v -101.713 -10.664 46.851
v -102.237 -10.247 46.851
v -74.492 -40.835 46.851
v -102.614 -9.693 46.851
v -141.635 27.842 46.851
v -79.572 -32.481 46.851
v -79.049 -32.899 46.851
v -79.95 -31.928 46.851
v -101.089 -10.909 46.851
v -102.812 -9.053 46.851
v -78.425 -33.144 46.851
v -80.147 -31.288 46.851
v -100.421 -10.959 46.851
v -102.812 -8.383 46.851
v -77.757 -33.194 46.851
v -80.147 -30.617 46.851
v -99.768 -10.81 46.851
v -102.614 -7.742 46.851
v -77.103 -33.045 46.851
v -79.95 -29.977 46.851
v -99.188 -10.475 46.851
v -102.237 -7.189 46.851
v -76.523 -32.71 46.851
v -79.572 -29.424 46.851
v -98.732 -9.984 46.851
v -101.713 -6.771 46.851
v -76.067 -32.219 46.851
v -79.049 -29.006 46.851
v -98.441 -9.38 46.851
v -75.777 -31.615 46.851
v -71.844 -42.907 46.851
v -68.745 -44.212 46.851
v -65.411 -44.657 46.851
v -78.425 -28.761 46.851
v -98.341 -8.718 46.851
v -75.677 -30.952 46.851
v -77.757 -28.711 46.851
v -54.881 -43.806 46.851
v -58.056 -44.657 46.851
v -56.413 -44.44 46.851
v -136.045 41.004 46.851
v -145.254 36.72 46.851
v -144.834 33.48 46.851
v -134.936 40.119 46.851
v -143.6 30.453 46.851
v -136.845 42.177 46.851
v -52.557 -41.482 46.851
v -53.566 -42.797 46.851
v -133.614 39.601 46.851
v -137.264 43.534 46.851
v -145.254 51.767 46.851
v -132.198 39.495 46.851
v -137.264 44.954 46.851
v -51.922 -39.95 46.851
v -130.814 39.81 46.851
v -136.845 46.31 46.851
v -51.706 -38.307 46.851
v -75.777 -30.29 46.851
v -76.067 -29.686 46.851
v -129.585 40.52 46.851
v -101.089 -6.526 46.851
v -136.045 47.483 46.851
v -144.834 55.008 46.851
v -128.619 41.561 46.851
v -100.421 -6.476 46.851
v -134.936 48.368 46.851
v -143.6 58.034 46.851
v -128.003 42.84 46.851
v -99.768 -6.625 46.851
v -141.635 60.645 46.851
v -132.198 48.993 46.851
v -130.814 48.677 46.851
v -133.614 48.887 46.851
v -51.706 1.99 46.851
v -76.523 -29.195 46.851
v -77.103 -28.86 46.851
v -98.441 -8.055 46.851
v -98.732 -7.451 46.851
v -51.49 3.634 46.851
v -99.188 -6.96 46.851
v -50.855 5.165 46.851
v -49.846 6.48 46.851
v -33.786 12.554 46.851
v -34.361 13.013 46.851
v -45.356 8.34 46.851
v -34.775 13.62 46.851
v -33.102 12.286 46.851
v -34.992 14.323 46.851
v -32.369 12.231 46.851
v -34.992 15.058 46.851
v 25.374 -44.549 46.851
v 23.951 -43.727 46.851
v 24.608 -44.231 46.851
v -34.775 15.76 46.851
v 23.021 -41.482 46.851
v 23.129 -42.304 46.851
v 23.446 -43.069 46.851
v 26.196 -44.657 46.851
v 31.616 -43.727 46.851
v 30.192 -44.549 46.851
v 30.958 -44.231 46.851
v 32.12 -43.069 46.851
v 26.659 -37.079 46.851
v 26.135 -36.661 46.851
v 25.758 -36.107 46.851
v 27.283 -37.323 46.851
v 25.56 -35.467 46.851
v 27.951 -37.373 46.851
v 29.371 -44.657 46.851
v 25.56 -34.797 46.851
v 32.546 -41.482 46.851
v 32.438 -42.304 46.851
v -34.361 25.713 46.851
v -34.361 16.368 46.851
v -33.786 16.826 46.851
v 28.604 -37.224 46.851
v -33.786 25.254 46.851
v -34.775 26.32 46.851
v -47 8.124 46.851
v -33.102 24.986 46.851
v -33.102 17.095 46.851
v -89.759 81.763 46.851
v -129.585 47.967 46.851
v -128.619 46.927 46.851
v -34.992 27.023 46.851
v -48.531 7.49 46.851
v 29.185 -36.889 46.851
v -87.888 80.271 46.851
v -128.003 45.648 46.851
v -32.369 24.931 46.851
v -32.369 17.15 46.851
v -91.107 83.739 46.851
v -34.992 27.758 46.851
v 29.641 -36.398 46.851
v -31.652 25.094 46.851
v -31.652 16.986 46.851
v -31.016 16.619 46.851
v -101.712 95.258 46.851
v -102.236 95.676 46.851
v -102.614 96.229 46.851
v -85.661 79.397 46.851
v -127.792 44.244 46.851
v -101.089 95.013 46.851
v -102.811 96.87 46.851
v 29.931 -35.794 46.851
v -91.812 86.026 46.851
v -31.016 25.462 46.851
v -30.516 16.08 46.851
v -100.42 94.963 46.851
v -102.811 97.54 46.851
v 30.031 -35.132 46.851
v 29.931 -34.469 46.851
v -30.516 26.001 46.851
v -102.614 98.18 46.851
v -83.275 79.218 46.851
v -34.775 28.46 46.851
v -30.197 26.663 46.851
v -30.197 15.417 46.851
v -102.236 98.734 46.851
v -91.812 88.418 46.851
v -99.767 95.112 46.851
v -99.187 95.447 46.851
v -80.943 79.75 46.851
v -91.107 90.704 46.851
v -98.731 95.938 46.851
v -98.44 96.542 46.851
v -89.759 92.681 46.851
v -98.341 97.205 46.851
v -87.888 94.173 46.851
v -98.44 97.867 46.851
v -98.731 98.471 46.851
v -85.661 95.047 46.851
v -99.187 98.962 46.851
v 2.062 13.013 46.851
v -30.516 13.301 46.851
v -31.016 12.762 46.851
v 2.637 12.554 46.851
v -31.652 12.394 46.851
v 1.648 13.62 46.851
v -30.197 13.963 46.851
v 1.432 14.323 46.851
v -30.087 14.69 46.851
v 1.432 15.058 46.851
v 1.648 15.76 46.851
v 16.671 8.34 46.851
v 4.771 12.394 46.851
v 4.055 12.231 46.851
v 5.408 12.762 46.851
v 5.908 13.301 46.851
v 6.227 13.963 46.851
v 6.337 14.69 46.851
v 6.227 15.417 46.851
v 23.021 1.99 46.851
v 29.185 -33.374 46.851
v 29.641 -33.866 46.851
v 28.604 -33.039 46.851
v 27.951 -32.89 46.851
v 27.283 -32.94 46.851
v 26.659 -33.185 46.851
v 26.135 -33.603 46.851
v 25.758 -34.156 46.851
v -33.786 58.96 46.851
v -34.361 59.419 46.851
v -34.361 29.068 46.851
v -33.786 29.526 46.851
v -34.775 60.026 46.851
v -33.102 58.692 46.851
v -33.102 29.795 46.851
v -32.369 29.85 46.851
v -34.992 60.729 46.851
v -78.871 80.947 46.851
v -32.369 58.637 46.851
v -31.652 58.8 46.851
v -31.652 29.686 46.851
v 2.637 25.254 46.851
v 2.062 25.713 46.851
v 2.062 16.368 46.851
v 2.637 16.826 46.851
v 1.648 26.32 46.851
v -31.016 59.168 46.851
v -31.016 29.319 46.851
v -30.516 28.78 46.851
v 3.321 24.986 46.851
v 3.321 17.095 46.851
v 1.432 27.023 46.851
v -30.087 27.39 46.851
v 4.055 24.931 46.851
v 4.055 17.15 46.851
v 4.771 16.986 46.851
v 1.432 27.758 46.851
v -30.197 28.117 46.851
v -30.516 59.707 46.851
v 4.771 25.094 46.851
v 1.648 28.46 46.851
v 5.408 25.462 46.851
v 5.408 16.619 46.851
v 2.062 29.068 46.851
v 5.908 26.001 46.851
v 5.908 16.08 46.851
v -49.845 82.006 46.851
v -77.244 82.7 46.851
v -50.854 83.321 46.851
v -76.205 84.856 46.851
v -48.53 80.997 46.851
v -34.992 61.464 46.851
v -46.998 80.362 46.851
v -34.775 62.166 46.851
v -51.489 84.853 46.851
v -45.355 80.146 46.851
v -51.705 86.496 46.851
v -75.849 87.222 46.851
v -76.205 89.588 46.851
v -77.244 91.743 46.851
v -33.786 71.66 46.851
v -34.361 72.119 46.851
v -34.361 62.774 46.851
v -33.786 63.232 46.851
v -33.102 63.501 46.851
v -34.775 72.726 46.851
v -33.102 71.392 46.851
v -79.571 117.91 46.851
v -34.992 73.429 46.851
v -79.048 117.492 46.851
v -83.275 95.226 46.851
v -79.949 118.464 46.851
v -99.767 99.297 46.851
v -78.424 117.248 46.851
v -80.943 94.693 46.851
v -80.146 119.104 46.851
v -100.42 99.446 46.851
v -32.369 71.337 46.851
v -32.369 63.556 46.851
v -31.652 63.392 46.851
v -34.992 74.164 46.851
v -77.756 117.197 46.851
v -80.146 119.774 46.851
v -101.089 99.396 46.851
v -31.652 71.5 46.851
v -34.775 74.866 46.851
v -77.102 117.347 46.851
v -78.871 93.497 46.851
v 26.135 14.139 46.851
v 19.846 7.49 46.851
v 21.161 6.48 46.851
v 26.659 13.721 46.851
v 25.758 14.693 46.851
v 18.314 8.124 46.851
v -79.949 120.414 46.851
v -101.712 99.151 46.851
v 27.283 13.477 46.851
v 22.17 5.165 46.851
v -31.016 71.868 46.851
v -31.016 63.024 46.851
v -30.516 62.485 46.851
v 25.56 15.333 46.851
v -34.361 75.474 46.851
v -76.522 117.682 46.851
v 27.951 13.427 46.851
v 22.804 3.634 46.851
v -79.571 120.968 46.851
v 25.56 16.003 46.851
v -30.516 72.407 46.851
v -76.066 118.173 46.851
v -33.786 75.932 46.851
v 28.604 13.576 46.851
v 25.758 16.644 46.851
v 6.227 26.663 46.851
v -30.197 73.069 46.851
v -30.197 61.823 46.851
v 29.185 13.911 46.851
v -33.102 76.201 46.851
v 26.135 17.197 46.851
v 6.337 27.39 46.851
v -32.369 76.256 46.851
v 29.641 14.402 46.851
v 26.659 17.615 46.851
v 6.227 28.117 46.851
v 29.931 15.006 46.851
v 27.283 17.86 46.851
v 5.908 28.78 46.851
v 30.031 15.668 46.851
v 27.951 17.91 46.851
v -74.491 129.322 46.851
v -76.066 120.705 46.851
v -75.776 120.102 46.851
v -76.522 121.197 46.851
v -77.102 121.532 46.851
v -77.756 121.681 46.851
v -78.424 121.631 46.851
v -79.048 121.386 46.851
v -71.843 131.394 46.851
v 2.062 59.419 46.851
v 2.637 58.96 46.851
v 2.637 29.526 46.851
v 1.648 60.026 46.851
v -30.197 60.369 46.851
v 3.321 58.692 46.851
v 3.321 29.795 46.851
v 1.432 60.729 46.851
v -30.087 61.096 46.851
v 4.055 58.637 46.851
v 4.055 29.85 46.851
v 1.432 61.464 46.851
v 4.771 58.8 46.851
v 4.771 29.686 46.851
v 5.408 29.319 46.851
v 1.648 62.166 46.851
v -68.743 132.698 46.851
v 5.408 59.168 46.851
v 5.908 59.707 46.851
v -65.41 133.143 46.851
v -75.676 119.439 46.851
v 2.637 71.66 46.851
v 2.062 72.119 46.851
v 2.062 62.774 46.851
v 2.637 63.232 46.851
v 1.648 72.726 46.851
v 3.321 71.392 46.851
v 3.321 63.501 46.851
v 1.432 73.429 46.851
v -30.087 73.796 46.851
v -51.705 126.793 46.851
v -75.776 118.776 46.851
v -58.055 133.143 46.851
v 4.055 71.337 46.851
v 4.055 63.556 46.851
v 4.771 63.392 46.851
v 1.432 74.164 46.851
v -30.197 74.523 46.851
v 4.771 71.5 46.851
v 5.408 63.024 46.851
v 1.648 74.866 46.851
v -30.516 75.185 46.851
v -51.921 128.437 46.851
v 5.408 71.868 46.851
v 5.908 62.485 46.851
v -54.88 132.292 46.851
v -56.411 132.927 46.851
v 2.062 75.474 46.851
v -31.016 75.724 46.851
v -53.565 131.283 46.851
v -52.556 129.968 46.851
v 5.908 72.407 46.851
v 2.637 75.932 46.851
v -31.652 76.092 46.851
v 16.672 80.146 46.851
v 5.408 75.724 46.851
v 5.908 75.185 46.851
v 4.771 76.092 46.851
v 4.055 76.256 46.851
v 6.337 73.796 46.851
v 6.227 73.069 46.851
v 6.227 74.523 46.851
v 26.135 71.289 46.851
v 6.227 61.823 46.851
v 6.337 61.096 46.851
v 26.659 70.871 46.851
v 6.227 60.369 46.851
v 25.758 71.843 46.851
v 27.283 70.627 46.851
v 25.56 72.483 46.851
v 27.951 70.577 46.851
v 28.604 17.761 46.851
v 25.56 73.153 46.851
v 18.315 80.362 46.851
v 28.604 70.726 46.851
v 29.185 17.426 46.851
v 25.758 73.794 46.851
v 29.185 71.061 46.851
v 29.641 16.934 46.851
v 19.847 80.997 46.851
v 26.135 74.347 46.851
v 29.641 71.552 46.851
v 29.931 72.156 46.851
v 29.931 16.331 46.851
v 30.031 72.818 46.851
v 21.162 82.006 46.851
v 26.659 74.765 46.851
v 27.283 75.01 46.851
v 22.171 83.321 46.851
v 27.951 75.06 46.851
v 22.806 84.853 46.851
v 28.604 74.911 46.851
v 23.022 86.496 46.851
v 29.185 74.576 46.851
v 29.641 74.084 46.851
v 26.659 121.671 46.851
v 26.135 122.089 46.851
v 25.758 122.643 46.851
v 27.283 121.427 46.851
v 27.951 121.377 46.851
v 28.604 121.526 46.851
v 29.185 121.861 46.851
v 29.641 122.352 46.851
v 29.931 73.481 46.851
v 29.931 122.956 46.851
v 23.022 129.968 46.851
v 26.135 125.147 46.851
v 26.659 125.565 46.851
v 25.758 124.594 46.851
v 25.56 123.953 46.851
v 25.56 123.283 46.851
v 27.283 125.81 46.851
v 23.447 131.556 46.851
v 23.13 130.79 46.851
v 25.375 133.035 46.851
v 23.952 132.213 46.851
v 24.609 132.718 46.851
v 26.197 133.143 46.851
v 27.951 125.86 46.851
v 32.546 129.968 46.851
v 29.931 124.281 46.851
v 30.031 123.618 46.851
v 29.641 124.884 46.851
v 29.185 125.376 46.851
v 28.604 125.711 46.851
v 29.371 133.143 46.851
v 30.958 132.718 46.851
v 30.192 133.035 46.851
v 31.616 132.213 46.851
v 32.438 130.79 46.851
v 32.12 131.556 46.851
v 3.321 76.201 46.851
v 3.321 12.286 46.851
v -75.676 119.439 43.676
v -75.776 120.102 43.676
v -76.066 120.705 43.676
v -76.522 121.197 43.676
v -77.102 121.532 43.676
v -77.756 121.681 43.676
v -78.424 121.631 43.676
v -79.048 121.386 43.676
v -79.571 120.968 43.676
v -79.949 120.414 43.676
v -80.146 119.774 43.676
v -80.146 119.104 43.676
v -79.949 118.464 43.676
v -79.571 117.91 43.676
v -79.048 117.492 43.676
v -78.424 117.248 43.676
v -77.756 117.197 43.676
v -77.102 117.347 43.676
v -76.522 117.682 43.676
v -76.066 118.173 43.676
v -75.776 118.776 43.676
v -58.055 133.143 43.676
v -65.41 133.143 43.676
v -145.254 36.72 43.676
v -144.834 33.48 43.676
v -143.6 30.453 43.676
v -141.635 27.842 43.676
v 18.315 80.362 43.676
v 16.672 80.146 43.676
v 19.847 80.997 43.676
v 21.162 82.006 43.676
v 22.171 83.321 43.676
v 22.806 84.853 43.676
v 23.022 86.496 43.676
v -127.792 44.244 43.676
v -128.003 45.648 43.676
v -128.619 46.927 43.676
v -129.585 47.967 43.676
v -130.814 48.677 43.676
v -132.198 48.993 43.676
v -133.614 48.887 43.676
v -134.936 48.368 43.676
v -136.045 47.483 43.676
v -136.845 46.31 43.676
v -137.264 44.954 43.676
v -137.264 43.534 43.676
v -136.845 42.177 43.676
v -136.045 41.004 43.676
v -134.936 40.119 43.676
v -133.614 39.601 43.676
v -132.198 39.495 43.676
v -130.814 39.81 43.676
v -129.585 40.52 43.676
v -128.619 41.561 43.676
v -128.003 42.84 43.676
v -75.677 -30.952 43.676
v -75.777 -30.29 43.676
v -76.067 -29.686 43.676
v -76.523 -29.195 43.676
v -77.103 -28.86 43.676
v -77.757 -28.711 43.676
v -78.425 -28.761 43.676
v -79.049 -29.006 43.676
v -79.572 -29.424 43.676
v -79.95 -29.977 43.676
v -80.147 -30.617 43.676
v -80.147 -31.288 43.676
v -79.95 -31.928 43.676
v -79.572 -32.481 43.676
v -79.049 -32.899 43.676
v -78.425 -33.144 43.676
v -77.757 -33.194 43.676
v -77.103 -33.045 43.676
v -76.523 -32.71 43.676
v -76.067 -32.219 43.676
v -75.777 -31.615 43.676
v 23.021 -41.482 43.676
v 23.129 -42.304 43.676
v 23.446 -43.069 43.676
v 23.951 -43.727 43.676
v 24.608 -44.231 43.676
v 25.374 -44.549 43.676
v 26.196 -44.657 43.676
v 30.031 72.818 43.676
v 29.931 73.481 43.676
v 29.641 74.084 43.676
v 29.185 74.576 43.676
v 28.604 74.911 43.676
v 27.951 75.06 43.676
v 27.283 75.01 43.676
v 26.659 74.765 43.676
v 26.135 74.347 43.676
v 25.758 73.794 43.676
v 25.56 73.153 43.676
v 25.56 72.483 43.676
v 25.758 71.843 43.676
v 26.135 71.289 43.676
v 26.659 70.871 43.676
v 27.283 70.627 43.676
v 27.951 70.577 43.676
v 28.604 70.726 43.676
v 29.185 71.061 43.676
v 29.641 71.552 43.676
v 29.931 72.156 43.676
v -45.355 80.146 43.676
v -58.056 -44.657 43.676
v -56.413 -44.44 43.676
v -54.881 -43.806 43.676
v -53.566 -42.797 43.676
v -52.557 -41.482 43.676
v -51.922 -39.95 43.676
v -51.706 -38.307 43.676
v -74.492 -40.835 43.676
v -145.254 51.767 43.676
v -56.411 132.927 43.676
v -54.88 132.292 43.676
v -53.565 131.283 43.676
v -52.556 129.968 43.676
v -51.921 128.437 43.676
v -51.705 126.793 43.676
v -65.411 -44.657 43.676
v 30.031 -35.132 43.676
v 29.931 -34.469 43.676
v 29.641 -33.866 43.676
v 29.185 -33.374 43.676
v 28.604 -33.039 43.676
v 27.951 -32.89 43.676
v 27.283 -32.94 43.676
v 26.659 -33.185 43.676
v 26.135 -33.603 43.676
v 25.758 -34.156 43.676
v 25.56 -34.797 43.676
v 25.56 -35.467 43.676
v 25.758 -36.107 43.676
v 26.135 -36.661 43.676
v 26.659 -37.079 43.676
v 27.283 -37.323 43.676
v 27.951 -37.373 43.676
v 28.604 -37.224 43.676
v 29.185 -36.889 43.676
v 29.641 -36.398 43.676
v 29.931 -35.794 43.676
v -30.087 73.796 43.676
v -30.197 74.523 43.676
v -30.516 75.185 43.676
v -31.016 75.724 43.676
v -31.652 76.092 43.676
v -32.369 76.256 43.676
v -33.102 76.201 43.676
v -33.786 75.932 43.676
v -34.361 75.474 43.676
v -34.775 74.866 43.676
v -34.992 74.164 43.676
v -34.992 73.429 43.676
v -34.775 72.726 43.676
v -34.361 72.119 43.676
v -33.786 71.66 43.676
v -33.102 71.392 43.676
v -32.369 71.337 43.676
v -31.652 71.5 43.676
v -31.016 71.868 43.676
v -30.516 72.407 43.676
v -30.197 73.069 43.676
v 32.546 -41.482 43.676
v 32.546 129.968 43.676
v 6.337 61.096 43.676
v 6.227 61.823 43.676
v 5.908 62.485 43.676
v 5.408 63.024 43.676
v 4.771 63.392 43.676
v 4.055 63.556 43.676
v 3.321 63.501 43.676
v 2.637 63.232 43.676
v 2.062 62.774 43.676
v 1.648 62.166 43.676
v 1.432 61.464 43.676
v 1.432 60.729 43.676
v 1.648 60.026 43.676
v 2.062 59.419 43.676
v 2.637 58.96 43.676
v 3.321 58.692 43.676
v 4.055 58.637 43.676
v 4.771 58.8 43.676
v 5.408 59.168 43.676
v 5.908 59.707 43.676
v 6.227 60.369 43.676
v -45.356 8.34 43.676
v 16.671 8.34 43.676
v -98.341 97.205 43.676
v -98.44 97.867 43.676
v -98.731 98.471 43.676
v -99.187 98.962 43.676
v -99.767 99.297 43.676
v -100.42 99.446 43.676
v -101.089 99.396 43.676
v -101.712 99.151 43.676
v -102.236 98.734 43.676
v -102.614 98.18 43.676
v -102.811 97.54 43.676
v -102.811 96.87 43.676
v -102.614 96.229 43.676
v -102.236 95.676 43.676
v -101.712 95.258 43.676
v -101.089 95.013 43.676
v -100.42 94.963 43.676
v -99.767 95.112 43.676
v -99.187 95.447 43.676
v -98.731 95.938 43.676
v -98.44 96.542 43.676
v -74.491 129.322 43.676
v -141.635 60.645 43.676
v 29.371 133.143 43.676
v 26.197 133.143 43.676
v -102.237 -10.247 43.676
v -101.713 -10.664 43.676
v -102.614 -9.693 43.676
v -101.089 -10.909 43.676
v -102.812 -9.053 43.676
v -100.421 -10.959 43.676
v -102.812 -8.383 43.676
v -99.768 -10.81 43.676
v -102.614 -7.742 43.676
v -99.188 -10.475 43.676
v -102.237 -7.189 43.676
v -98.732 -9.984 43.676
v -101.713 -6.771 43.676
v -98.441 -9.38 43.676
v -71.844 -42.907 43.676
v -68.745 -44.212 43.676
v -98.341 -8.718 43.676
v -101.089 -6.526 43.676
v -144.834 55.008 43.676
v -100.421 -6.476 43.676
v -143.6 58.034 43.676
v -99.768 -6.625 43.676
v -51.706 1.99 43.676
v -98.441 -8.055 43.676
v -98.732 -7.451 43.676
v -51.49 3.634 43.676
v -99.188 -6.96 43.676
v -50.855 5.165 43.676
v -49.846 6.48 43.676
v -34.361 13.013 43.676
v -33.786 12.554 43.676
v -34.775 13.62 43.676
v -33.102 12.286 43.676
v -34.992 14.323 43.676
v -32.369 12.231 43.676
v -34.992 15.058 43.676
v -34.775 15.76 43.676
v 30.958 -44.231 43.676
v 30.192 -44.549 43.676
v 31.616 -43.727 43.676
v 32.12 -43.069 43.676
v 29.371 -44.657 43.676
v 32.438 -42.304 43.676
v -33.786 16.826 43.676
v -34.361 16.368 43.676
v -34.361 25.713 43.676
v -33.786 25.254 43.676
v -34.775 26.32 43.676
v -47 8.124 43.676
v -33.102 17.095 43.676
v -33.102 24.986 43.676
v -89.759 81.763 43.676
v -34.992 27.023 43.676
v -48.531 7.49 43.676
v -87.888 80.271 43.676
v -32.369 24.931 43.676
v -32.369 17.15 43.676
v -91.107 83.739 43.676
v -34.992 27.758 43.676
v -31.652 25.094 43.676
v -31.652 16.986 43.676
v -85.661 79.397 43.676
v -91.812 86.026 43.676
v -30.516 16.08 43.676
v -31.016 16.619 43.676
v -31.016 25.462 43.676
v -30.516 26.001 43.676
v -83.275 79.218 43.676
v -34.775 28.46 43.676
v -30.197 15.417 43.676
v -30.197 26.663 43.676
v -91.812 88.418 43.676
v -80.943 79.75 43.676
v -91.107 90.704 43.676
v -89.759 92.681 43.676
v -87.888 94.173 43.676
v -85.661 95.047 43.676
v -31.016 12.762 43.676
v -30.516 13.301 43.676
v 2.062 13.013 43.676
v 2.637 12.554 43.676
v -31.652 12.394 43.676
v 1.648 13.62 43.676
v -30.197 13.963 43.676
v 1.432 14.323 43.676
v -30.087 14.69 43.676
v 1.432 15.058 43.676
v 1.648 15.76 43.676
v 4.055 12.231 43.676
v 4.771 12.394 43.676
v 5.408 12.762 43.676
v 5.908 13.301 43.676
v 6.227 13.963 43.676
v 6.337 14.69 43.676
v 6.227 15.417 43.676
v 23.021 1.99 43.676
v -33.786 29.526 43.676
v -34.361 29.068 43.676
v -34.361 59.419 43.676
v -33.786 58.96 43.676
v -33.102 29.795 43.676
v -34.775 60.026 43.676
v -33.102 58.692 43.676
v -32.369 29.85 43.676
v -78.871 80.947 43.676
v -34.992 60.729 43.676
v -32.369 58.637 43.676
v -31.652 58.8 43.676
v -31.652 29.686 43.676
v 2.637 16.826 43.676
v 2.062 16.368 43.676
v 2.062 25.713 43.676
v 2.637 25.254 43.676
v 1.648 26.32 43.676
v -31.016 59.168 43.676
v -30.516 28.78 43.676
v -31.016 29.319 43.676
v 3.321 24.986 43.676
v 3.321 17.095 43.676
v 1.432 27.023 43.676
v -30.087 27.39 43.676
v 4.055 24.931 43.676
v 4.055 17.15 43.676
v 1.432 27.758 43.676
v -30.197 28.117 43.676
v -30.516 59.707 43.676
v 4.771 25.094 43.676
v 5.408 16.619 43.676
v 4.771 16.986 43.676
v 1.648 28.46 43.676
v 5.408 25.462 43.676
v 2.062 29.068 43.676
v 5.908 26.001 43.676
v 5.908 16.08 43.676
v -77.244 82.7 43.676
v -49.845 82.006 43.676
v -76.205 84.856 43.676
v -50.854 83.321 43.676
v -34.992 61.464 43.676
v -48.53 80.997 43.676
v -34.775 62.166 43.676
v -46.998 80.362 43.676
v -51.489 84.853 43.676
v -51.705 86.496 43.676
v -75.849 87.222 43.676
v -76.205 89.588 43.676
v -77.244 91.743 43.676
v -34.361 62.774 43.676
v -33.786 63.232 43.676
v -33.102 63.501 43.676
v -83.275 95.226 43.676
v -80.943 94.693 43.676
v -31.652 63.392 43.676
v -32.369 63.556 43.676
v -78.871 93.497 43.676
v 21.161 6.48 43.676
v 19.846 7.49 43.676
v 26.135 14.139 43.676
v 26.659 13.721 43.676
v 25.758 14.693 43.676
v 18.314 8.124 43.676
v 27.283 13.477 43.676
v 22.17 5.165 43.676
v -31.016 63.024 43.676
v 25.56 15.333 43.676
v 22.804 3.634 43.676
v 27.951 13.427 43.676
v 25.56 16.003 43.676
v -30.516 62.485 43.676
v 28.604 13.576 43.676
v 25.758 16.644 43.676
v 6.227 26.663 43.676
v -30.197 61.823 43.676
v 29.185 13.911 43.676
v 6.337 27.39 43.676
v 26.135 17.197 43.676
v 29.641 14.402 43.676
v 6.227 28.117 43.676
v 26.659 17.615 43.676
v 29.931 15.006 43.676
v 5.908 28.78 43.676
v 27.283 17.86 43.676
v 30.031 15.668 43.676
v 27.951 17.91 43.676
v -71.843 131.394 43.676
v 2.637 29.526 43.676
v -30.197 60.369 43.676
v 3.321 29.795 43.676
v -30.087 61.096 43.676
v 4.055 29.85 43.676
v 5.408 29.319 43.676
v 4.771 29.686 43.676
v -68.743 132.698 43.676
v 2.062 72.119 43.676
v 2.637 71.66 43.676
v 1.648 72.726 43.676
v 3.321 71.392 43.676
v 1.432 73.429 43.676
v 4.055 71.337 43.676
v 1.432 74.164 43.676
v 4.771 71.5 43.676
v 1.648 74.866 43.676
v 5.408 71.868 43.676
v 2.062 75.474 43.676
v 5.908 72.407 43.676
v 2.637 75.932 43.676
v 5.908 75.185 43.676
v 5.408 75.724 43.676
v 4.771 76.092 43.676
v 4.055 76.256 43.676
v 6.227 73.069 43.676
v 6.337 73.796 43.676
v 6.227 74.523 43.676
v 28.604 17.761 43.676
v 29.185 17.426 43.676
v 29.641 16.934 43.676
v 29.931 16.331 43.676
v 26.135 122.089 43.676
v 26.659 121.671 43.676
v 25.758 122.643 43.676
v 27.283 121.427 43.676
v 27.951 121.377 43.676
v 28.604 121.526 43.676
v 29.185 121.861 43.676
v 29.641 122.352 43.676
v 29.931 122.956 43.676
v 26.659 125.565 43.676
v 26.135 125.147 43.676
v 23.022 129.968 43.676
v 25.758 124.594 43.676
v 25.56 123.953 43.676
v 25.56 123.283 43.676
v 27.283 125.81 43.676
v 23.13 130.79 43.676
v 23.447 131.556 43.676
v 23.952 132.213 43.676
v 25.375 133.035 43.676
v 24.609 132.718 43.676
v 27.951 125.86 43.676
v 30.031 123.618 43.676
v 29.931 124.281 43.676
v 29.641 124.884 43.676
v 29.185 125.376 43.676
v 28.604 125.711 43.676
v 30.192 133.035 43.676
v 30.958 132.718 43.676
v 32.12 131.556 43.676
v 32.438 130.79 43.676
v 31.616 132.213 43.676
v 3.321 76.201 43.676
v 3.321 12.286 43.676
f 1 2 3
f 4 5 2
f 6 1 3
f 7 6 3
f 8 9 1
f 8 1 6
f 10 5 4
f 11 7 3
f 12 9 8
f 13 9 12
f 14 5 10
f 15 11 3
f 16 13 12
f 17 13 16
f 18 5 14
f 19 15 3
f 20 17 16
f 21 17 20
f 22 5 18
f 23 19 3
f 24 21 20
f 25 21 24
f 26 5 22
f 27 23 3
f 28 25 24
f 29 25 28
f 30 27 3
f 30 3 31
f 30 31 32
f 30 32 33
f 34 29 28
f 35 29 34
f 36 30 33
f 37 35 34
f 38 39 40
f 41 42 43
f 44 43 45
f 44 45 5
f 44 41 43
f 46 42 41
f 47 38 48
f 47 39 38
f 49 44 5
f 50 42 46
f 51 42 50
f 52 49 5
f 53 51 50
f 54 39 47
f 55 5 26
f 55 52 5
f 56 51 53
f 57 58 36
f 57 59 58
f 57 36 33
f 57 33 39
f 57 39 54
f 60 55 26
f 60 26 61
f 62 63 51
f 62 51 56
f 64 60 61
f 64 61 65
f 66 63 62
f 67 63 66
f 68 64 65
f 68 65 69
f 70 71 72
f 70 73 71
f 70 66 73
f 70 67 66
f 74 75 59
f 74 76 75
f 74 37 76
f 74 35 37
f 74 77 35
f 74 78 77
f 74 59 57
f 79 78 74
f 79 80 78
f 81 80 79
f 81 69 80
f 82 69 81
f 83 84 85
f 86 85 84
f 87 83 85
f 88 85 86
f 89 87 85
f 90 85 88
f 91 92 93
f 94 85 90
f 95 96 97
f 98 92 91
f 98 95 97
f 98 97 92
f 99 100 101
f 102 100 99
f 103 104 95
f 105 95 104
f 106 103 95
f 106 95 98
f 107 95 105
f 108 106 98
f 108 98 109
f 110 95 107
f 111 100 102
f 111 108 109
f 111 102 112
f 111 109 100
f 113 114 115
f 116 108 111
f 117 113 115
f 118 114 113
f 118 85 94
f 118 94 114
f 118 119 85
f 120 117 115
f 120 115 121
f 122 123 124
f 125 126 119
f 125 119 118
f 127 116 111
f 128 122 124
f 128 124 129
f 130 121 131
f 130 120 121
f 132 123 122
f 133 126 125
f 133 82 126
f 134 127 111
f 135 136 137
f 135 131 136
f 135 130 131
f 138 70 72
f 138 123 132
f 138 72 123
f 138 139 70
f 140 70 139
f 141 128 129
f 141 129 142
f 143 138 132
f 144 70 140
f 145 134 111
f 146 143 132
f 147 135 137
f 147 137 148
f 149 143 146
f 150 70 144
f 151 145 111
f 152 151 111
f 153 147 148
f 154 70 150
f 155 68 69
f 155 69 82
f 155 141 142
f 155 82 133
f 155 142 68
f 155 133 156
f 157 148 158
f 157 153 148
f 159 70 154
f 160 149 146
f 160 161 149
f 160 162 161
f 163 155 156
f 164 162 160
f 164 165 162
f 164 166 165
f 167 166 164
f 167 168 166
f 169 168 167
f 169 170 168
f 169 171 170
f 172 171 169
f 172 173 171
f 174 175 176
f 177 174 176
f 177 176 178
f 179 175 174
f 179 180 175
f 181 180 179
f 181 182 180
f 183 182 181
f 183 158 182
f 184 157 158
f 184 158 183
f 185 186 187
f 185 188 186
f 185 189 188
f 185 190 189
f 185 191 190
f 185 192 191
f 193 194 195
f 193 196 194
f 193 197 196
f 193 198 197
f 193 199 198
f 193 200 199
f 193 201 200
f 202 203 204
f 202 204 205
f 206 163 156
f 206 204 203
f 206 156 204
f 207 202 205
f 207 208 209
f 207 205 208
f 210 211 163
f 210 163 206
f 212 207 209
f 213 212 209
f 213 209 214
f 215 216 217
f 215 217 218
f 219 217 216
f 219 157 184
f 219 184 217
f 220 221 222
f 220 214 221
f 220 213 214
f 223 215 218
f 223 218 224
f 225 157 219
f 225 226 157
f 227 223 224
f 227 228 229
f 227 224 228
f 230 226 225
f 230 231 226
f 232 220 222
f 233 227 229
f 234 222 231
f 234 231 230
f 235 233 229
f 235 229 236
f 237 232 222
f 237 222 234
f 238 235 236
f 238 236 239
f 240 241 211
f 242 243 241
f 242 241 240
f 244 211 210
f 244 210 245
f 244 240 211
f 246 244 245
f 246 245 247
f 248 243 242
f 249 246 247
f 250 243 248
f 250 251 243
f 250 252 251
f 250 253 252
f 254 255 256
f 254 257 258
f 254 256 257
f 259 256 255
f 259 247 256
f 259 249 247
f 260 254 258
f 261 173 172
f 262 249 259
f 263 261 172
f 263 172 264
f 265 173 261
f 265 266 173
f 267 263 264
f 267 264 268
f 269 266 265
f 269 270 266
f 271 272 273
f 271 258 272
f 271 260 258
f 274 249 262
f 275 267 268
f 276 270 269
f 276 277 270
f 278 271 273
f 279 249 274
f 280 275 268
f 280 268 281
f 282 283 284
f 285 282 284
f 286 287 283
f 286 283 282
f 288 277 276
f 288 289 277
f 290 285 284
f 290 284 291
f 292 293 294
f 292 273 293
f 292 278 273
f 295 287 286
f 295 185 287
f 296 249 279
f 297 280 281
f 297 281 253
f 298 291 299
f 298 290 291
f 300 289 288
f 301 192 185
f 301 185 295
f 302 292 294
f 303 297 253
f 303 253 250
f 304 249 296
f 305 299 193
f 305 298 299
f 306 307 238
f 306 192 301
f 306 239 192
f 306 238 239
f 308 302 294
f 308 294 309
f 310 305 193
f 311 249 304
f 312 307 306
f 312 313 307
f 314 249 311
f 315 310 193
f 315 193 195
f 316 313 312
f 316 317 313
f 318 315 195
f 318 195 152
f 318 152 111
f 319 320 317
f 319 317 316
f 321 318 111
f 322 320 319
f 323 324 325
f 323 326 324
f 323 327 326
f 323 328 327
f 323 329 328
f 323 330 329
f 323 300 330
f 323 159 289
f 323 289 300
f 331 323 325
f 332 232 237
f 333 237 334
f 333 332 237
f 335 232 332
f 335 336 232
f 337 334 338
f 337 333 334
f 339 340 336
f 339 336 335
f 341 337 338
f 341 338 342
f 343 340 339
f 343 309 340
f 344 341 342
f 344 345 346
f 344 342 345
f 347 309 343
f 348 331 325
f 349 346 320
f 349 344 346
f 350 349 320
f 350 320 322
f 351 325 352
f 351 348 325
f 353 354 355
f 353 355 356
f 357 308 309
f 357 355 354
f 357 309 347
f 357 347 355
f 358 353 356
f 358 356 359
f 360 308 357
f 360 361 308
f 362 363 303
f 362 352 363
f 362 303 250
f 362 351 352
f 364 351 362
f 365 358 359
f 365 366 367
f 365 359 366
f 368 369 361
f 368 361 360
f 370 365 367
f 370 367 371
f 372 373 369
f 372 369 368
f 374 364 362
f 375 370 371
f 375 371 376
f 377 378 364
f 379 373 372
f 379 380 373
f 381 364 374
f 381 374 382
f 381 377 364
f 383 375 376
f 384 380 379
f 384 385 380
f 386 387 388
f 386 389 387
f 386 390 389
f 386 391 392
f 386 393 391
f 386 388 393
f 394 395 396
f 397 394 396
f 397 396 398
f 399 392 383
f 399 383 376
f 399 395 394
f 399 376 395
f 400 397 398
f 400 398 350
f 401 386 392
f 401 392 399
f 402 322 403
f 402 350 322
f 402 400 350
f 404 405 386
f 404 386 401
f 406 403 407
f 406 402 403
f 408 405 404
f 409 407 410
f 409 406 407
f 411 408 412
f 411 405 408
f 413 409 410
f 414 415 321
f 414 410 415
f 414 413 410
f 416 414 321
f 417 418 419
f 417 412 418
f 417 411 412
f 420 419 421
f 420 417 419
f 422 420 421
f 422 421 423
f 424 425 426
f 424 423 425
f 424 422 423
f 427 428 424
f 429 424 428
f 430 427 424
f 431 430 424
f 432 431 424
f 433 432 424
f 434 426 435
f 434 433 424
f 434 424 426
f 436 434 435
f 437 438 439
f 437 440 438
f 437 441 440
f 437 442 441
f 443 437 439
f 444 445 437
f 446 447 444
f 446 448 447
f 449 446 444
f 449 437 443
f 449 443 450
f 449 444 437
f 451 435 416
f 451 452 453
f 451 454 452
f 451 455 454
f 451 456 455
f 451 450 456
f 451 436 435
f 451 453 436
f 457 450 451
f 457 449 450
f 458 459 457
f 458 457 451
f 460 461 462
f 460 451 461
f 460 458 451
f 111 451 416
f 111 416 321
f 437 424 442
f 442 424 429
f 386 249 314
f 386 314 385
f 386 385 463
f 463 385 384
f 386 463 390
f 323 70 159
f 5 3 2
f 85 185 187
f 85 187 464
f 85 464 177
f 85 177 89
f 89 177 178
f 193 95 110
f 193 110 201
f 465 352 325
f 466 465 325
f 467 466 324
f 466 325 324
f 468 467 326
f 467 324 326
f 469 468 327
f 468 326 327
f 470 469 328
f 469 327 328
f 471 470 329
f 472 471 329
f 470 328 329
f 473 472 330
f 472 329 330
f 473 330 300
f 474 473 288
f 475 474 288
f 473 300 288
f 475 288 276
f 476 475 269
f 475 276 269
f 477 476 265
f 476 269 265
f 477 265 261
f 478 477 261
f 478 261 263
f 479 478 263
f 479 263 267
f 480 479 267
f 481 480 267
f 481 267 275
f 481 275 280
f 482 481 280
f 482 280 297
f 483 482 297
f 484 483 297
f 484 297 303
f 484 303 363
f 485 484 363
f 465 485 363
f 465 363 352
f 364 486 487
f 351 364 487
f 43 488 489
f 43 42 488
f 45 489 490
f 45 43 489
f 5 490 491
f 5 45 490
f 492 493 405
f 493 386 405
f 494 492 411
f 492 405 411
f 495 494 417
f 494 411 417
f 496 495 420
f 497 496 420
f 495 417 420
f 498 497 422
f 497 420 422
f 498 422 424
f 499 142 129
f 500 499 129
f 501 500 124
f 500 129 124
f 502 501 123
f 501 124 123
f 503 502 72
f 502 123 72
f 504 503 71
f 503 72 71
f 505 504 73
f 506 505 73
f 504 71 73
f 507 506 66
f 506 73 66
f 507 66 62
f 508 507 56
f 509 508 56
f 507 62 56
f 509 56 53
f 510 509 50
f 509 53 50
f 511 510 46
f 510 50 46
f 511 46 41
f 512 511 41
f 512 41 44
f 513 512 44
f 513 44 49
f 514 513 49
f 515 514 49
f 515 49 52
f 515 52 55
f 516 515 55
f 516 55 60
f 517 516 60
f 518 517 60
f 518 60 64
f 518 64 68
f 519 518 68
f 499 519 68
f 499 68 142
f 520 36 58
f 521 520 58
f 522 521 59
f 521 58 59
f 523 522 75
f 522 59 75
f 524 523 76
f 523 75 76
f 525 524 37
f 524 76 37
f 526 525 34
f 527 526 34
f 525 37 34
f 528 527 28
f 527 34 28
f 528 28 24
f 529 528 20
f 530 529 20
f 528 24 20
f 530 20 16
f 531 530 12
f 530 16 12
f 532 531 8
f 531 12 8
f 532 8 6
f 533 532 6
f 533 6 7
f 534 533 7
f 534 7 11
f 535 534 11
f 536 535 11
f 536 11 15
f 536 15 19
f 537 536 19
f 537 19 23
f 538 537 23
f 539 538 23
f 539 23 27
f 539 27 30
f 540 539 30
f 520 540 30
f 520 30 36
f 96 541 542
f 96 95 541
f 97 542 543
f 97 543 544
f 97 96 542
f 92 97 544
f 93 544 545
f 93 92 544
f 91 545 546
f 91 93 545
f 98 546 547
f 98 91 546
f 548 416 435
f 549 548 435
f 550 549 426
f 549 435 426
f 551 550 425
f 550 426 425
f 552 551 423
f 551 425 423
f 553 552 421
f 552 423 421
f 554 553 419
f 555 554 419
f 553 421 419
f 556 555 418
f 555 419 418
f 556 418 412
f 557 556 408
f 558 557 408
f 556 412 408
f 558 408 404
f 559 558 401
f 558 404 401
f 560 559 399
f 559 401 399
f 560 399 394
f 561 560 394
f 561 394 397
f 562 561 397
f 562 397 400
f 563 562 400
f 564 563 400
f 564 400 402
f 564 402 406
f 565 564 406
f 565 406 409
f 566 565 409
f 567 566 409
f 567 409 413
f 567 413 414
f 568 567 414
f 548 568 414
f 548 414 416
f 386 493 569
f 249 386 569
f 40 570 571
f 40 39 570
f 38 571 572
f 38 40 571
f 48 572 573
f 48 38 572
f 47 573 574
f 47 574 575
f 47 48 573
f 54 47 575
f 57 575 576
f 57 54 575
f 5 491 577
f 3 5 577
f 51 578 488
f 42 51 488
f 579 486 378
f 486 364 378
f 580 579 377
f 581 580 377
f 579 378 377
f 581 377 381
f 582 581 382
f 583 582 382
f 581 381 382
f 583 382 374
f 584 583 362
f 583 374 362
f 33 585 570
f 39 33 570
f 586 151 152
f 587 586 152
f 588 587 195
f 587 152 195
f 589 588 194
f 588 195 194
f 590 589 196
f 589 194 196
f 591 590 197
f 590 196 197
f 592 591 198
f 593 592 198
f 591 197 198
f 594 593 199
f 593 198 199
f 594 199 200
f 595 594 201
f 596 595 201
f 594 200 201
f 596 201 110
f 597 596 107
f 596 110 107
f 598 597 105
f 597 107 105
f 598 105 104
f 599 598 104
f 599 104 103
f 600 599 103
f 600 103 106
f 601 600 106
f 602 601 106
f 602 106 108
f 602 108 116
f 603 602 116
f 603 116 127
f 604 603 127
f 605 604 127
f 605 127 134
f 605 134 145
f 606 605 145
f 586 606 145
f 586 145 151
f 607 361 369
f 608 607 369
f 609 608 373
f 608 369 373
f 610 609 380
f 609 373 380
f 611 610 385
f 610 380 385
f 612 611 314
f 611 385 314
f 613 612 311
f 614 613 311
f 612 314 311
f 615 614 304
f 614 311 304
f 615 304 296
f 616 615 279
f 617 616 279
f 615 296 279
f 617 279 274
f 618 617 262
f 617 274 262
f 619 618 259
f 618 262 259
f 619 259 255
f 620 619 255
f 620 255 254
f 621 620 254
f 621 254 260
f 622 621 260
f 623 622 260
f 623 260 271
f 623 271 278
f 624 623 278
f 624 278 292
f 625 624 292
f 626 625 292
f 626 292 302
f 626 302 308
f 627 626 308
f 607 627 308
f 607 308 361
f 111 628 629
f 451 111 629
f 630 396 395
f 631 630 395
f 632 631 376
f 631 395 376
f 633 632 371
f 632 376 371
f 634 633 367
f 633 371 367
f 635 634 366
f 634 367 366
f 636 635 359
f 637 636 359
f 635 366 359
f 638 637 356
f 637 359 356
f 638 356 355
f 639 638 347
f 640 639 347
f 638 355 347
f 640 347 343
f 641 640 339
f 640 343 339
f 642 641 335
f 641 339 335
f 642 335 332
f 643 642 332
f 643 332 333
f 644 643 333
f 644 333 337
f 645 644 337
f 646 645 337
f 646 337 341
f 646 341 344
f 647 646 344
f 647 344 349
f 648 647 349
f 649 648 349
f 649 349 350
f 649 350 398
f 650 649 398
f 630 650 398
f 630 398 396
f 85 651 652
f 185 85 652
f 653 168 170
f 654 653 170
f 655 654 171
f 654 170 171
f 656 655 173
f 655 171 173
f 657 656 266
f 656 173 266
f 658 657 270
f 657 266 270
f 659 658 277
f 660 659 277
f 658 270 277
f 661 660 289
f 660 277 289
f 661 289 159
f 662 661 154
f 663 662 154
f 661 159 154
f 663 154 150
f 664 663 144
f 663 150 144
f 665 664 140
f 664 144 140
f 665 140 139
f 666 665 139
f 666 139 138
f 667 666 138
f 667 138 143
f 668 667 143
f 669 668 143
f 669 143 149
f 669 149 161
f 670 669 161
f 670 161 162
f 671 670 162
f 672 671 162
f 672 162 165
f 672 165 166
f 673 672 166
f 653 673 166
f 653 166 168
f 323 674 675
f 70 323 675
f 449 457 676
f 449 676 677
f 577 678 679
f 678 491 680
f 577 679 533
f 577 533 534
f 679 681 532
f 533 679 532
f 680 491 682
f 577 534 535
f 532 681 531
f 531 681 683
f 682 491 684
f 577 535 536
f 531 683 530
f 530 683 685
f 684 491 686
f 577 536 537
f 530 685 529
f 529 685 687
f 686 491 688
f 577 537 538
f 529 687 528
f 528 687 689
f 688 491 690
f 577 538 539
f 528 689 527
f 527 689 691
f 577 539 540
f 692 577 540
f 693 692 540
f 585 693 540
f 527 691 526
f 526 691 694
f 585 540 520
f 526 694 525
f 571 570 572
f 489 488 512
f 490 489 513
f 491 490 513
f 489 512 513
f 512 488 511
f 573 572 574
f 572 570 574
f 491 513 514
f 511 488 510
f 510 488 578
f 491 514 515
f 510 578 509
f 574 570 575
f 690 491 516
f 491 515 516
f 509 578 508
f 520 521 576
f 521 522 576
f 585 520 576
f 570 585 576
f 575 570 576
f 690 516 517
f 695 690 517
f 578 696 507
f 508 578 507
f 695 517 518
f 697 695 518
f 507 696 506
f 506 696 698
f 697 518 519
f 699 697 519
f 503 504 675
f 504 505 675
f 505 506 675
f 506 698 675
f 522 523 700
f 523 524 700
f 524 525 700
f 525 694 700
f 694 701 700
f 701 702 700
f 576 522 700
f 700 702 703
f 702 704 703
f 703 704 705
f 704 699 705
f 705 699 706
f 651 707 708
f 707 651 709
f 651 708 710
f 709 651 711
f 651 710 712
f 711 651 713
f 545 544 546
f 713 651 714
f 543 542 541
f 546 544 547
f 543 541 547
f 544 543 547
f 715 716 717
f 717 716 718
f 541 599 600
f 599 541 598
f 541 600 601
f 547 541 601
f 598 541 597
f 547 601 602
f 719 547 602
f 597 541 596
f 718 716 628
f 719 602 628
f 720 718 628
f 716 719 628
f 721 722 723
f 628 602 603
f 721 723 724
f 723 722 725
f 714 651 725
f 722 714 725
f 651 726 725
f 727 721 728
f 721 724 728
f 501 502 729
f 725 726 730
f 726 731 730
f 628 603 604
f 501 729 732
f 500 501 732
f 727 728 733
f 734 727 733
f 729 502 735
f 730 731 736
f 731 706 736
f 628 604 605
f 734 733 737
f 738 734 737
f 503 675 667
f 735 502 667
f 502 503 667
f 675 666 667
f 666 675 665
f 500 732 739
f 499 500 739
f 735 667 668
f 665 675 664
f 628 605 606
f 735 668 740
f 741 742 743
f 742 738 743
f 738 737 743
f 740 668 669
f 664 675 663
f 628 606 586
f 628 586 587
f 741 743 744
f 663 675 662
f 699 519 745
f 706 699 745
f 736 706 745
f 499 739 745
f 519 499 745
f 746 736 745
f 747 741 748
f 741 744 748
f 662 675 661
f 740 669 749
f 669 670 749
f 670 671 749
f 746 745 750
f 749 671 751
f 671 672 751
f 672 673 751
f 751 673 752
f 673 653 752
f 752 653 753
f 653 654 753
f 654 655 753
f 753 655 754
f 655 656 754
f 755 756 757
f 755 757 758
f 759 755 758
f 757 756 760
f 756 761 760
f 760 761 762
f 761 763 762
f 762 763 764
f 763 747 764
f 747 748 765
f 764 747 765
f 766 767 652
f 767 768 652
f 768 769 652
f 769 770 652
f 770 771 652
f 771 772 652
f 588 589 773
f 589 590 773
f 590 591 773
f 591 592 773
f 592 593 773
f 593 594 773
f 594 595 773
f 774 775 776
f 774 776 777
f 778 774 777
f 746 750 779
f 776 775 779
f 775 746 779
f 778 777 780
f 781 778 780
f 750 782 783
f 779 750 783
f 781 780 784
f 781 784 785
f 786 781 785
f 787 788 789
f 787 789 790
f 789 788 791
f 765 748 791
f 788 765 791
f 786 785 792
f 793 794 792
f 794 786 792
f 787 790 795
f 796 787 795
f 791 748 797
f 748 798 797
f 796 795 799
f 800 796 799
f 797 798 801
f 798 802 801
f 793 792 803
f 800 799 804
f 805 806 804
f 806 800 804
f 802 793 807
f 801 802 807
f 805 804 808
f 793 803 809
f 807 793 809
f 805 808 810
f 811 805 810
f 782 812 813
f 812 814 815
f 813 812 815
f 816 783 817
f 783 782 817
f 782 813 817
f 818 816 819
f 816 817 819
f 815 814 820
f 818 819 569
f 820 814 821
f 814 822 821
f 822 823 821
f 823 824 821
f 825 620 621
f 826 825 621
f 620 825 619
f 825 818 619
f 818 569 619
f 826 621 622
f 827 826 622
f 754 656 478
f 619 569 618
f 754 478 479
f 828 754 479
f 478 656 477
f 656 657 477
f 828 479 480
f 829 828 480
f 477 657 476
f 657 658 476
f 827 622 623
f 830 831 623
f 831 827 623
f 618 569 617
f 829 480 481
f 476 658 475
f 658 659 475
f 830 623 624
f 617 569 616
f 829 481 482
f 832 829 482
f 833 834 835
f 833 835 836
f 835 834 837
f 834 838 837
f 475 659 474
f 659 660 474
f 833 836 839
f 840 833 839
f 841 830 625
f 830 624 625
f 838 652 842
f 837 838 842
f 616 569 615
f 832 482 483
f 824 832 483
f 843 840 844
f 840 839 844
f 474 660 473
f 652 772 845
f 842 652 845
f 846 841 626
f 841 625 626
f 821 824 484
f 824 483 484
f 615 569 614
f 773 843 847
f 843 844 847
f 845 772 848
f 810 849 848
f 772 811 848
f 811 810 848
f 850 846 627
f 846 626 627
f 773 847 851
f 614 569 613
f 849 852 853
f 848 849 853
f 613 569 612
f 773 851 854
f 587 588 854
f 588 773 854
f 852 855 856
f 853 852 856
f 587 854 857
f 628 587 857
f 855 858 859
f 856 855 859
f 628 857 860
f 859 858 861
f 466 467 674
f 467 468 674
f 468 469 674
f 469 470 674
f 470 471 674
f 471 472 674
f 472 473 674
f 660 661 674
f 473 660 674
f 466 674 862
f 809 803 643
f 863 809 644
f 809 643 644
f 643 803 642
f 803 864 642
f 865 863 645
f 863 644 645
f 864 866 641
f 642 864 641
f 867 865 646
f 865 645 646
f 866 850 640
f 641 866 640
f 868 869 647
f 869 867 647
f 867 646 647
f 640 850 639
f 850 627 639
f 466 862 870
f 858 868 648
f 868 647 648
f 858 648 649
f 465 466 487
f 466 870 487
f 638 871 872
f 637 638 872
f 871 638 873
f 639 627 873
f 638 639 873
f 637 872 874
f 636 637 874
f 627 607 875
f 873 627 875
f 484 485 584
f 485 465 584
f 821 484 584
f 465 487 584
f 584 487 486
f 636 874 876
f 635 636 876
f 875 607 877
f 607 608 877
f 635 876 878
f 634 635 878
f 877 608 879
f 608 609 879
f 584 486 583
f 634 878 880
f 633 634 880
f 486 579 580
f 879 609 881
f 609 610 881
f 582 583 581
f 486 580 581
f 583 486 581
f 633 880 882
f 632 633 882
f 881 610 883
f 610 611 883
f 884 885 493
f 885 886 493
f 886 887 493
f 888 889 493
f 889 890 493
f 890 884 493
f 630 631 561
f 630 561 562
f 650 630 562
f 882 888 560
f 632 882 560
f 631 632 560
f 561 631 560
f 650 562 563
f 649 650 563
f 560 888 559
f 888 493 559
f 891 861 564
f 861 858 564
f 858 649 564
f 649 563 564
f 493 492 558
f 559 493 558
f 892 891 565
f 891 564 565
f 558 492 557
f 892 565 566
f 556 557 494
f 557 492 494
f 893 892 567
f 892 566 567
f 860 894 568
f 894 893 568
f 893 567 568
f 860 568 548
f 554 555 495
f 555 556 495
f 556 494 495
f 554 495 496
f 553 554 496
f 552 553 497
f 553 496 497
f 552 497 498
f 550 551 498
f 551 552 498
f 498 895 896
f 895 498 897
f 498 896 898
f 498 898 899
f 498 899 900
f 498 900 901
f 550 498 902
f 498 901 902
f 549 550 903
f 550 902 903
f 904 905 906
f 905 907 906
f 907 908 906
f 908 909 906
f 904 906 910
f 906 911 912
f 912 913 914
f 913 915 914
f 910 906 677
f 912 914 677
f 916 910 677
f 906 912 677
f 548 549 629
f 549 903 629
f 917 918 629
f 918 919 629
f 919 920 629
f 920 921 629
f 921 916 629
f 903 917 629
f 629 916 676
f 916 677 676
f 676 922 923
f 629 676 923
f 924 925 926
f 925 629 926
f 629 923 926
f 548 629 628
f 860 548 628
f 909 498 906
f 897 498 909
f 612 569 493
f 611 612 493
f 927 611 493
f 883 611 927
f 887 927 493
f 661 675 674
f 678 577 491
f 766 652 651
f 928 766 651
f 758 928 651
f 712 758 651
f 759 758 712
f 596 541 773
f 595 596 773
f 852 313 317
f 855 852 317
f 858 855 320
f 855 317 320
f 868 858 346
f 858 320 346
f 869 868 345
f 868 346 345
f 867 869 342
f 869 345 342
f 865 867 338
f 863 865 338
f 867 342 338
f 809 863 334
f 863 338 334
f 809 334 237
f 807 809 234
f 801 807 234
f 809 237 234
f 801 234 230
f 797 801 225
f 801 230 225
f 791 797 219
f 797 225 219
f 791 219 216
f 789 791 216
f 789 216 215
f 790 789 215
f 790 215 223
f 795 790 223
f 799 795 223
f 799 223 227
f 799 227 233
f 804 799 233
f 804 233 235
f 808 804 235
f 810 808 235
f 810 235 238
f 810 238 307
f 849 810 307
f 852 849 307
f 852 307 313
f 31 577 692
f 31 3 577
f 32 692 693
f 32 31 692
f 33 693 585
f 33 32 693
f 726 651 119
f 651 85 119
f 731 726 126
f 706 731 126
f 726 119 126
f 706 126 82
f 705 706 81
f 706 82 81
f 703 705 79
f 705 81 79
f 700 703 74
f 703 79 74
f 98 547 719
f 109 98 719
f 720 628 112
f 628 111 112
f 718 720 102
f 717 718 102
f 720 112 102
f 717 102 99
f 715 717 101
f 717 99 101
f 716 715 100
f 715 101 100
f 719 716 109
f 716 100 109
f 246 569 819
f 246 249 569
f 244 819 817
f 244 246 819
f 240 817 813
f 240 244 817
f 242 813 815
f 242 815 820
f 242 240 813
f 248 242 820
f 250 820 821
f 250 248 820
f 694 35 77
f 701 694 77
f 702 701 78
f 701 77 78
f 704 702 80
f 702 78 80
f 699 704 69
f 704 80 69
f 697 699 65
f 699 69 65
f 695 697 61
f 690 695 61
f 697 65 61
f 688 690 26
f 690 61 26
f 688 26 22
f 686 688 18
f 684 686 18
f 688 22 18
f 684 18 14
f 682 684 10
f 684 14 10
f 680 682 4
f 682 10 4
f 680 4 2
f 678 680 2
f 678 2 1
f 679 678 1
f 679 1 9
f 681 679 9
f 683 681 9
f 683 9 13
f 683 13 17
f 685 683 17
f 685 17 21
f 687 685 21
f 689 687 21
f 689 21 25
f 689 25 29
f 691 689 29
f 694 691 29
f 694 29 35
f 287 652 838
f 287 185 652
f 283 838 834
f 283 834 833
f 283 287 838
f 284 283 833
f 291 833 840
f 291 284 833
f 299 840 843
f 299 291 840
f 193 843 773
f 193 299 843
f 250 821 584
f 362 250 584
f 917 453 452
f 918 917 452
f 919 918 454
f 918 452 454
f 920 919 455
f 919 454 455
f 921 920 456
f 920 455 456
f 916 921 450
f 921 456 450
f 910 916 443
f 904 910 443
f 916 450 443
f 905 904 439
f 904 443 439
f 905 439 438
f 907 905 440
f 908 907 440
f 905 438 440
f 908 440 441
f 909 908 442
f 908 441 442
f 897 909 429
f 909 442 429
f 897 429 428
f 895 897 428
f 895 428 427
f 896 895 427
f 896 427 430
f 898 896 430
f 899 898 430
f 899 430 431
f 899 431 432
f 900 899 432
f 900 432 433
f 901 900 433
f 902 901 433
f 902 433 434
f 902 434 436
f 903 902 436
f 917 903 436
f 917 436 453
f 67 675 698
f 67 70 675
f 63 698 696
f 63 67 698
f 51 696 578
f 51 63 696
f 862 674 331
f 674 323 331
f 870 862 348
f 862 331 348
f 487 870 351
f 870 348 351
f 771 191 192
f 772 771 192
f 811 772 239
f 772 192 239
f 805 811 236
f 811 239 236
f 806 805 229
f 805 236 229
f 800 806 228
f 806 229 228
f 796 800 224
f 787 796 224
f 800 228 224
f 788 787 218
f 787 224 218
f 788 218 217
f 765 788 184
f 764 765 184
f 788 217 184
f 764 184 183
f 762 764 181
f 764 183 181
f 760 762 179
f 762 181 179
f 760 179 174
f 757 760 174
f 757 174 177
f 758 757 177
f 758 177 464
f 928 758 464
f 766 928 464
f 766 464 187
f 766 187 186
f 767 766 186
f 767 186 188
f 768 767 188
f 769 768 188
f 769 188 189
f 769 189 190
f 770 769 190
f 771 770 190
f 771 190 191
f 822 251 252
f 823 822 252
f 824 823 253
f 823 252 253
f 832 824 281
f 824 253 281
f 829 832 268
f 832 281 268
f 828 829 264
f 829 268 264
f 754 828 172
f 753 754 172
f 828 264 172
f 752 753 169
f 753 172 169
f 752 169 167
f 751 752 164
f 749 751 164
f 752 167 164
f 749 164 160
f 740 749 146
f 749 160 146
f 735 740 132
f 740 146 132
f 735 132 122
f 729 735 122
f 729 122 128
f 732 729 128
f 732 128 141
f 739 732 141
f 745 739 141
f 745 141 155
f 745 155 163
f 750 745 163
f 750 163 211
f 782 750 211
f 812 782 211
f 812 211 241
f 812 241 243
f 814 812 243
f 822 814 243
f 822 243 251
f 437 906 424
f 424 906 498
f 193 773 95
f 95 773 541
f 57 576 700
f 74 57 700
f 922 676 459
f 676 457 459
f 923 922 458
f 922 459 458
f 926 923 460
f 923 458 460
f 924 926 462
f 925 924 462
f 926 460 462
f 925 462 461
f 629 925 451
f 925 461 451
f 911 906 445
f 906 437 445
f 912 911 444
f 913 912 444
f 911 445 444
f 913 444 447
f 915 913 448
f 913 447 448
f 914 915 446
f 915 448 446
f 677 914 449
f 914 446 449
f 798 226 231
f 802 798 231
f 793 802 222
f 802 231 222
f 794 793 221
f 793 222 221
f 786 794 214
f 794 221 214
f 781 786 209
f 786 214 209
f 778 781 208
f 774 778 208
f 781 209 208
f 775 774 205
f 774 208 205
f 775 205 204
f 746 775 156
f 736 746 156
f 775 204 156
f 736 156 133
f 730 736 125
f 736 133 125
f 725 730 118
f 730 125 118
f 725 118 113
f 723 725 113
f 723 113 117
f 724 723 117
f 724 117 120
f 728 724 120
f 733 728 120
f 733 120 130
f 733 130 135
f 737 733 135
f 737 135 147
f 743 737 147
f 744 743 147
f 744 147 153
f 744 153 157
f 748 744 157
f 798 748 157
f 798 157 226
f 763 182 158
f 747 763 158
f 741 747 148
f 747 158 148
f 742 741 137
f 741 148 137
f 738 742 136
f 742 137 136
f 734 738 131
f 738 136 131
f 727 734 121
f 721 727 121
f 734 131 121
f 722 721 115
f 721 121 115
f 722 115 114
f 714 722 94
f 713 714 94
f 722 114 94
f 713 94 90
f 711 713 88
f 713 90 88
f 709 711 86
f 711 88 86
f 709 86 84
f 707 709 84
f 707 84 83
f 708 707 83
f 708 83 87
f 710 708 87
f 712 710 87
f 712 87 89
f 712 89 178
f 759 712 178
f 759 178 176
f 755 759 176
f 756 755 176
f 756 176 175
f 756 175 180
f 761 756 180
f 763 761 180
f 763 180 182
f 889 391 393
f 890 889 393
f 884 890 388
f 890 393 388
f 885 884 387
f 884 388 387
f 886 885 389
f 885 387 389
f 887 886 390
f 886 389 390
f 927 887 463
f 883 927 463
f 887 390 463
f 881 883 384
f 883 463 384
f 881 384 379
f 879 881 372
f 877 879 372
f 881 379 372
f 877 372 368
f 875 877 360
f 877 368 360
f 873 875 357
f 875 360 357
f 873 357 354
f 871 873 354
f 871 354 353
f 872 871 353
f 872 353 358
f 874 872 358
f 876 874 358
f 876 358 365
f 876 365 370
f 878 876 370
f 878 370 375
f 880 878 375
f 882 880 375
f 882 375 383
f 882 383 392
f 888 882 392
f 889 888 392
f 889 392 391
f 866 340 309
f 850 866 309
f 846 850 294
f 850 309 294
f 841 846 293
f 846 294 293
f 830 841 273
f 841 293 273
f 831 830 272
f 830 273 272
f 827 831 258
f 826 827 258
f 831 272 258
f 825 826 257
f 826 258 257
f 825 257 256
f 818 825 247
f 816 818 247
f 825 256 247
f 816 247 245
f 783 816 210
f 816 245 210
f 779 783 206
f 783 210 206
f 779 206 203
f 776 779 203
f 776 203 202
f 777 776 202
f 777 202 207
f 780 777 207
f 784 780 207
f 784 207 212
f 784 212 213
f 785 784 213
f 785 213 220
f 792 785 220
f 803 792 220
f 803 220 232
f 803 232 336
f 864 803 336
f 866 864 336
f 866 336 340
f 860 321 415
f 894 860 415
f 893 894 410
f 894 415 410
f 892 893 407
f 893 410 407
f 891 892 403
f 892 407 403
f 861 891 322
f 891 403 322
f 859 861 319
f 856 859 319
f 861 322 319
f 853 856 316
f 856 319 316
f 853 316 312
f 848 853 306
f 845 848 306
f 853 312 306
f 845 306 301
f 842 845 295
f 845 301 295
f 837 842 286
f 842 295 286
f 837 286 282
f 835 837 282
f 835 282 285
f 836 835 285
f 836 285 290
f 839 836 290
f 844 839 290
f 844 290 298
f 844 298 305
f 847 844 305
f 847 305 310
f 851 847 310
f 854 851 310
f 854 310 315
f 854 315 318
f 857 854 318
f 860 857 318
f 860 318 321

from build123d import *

# Parameters (mm, degrees)
PAD_DEPTH       = 3.175
SKETCH001_R     = 8.0264
SKETCH001_R_2   = 4.7625
SKETCH001_R_3   = 2.46634
POCKET_DEPTH    = 3.176
FILLET_R        = 12.7
FILLET001_R     = 12.7
FILLET002_R     = 12.7
FILLET003_R     = 12.7
FILLET004_R     = 6.35
FILLET005_R     = 6.35
FILLET006_R     = 6.35
FILLET007_R     = 6.35
FILLET008_R     = 3.175
SKETCH002_R     = 2.2479
POCKET001_DEPTH = 3.176
FILLET009_R     = 6.35
FILLET010_R     = 6.35
FILLET011_R     = 3.175
FILLET012_R     = 3.175
SKETCH003_R     = 2.2479
POCKET002_DEPTH = 3.176


with BuildPart() as part:
    # Sketch → Pad (new body)
    with BuildSketch(Plane(origin=(-14.3421, 44.2432, 43.6758), x_dir=(1, 0, 0), z_dir=(0, 0, 1))):
        Polygon((37.363997, 35.9029), (-37.362803, 35.9029), (-37.362803, 88.9), (-56.412803, 88.9), (-130.912197, 12.700584), (-130.912197, -12.699416), (-56.413997, -88.9), (-37.363997, -88.9), (-37.363997, -35.9029), (37.362803, -35.9029), (37.362803, -88.9), (46.887803, -88.9), (46.887803, 88.9), (37.363997, 88.9), align=None)
    extrude(amount=PAD_DEPTH)

    # Sketch001 → Pocket (cut, through all)
    with BuildSketch(Plane(origin=(-14.3421, 44.2432, 46.8508), x_dir=(1, 0, 0), z_dir=(0, 0, 1))):
        with Locations((-69.533135, 42.978666)):
            Circle(SKETCH001_R)
        with Locations((-118.212197, 0.000584)):
            Circle(SKETCH001_R_2)
        with Locations((-18.211203, 29.5529)):
            Circle(SKETCH001_R_3)
        with Locations((18.212397, 29.5529)):
            Circle(SKETCH001_R_3)
        with Locations((-18.211203, 16.8529)):
            Circle(SKETCH001_R_3)
        with Locations((18.212397, 16.8529)):
            Circle(SKETCH001_R_3)
        with Locations((-18.211203, -16.8529)):
            Circle(SKETCH001_R_3)
        with Locations((18.212397, -16.8529)):
            Circle(SKETCH001_R_3)
        with Locations((-18.211203, -29.5529)):
            Circle(SKETCH001_R_3)
        with Locations((18.212397, -29.5529)):
            Circle(SKETCH001_R_3)
    extrude(amount=-POCKET_DEPTH, mode=Mode.SUBTRACT)

    # Fillet
    fillet_edges = [part.edges().sort_by_distance(p)[0] for p in [
        (-145.254297, 56.943784, 45.2633),
    ]]
    fillet(fillet_edges, radius=FILLET_R)

    # Fillet001
    fillet001_edges = [part.edges().sort_by_distance(p)[0] for p in [
        (-145.254297, 31.543784, 45.2633),
    ]]
    fillet(fillet001_edges, radius=FILLET001_R)

    # Fillet002
    fillet002_edges = [part.edges().sort_by_distance(p)[0] for p in [
        (-70.756097, -44.6568, 45.2633),
    ]]
    fillet(fillet002_edges, radius=FILLET002_R)

    # Fillet003
    fillet003_edges = [part.edges().sort_by_distance(p)[0] for p in [
        (-70.754903, 133.1432, 45.2633),
    ]]
    fillet(fillet003_edges, radius=FILLET003_R)

    # Fillet004
    fillet004_edges = [part.edges().sort_by_distance(p)[0] for p in [
        (-51.706097, -44.6568, 45.2633),
    ]]
    fillet(fillet004_edges, radius=FILLET004_R)

    # Fillet005
    fillet005_edges = [part.edges().sort_by_distance(p)[0] for p in [
        (-51.704903, 133.1432, 45.2633),
    ]]
    fillet(fillet005_edges, radius=FILLET005_R)

    # Fillet006
    fillet006_edges = [part.edges().sort_by_distance(p)[0] for p in [
        (-51.706097, 8.3403, 45.2633),
    ]]
    fillet(fillet006_edges, radius=FILLET006_R)

    # Fillet007
    fillet007_edges = [part.edges().sort_by_distance(p)[0] for p in [
        (23.020703, 8.3403, 45.2633),
    ]]
    fillet(fillet007_edges, radius=FILLET007_R)

    # Fillet008
    fillet008_edges = [part.edges().sort_by_distance(p)[0] for p in [
        (23.020703, -44.6568, 45.2633),
    ]]
    fillet(fillet008_edges, radius=FILLET008_R)

    # Sketch002 → Pocket001 (cut, through all)
    with BuildSketch(Plane(origin=(-14.3421, 44.2432, 46.8508), x_dir=(1, 0, 0), z_dir=(0, 0, 1))):
        with Locations((-63.581526, 75.195872)):
            Circle(SKETCH002_R)
        with Locations((-86.246322, 52.96145)):
            Circle(SKETCH002_R)
        with Locations((-86.247007, -52.960923)):
            Circle(SKETCH002_R)
        with Locations((-63.582545, -75.195686)):
            Circle(SKETCH002_R)
    extrude(amount=-POCKET001_DEPTH, mode=Mode.SUBTRACT)

    # Fillet009
    fillet009_edges = [part.edges().sort_by_distance(p)[0] for p in [
        (-51.704903, 80.1461, 45.2633),
    ]]
    fillet(fillet009_edges, radius=FILLET009_R)

    # Fillet010
    fillet010_edges = [part.edges().sort_by_distance(p)[0] for p in [
        (23.021897, 80.1461, 45.2633),
    ]]
    fillet(fillet010_edges, radius=FILLET010_R)

    # Fillet011
    fillet011_edges = [part.edges().sort_by_distance(p)[0] for p in [
        (23.021897, 133.1432, 45.2633),
        (32.545703, 133.1432, 45.2633),
    ]]
    fillet(fillet011_edges, radius=FILLET011_R)

    # Fillet012
    fillet012_edges = [part.edges().sort_by_distance(p)[0] for p in [
        (32.545703, -44.6568, 45.2633),
    ]]
    fillet(fillet012_edges, radius=FILLET012_R)

    # Sketch003 → Pocket002 (cut, through all)
    with BuildSketch(Plane(origin=(-14.3421, 44.2432, 46.8508), x_dir=(1, 0, 0), z_dir=(0, 0, 1))):
        with Locations((42.125303, -28.575)):
            Circle(SKETCH003_R)
        with Locations((42.125303, 79.375)):
            Circle(SKETCH003_R)
        with Locations((42.125303, -79.375)):
            Circle(SKETCH003_R)
        with Locations((42.125303, 28.575)):
            Circle(SKETCH003_R)
    extrude(amount=-POCKET002_DEPTH, mode=Mode.SUBTRACT)


solid = part.part
